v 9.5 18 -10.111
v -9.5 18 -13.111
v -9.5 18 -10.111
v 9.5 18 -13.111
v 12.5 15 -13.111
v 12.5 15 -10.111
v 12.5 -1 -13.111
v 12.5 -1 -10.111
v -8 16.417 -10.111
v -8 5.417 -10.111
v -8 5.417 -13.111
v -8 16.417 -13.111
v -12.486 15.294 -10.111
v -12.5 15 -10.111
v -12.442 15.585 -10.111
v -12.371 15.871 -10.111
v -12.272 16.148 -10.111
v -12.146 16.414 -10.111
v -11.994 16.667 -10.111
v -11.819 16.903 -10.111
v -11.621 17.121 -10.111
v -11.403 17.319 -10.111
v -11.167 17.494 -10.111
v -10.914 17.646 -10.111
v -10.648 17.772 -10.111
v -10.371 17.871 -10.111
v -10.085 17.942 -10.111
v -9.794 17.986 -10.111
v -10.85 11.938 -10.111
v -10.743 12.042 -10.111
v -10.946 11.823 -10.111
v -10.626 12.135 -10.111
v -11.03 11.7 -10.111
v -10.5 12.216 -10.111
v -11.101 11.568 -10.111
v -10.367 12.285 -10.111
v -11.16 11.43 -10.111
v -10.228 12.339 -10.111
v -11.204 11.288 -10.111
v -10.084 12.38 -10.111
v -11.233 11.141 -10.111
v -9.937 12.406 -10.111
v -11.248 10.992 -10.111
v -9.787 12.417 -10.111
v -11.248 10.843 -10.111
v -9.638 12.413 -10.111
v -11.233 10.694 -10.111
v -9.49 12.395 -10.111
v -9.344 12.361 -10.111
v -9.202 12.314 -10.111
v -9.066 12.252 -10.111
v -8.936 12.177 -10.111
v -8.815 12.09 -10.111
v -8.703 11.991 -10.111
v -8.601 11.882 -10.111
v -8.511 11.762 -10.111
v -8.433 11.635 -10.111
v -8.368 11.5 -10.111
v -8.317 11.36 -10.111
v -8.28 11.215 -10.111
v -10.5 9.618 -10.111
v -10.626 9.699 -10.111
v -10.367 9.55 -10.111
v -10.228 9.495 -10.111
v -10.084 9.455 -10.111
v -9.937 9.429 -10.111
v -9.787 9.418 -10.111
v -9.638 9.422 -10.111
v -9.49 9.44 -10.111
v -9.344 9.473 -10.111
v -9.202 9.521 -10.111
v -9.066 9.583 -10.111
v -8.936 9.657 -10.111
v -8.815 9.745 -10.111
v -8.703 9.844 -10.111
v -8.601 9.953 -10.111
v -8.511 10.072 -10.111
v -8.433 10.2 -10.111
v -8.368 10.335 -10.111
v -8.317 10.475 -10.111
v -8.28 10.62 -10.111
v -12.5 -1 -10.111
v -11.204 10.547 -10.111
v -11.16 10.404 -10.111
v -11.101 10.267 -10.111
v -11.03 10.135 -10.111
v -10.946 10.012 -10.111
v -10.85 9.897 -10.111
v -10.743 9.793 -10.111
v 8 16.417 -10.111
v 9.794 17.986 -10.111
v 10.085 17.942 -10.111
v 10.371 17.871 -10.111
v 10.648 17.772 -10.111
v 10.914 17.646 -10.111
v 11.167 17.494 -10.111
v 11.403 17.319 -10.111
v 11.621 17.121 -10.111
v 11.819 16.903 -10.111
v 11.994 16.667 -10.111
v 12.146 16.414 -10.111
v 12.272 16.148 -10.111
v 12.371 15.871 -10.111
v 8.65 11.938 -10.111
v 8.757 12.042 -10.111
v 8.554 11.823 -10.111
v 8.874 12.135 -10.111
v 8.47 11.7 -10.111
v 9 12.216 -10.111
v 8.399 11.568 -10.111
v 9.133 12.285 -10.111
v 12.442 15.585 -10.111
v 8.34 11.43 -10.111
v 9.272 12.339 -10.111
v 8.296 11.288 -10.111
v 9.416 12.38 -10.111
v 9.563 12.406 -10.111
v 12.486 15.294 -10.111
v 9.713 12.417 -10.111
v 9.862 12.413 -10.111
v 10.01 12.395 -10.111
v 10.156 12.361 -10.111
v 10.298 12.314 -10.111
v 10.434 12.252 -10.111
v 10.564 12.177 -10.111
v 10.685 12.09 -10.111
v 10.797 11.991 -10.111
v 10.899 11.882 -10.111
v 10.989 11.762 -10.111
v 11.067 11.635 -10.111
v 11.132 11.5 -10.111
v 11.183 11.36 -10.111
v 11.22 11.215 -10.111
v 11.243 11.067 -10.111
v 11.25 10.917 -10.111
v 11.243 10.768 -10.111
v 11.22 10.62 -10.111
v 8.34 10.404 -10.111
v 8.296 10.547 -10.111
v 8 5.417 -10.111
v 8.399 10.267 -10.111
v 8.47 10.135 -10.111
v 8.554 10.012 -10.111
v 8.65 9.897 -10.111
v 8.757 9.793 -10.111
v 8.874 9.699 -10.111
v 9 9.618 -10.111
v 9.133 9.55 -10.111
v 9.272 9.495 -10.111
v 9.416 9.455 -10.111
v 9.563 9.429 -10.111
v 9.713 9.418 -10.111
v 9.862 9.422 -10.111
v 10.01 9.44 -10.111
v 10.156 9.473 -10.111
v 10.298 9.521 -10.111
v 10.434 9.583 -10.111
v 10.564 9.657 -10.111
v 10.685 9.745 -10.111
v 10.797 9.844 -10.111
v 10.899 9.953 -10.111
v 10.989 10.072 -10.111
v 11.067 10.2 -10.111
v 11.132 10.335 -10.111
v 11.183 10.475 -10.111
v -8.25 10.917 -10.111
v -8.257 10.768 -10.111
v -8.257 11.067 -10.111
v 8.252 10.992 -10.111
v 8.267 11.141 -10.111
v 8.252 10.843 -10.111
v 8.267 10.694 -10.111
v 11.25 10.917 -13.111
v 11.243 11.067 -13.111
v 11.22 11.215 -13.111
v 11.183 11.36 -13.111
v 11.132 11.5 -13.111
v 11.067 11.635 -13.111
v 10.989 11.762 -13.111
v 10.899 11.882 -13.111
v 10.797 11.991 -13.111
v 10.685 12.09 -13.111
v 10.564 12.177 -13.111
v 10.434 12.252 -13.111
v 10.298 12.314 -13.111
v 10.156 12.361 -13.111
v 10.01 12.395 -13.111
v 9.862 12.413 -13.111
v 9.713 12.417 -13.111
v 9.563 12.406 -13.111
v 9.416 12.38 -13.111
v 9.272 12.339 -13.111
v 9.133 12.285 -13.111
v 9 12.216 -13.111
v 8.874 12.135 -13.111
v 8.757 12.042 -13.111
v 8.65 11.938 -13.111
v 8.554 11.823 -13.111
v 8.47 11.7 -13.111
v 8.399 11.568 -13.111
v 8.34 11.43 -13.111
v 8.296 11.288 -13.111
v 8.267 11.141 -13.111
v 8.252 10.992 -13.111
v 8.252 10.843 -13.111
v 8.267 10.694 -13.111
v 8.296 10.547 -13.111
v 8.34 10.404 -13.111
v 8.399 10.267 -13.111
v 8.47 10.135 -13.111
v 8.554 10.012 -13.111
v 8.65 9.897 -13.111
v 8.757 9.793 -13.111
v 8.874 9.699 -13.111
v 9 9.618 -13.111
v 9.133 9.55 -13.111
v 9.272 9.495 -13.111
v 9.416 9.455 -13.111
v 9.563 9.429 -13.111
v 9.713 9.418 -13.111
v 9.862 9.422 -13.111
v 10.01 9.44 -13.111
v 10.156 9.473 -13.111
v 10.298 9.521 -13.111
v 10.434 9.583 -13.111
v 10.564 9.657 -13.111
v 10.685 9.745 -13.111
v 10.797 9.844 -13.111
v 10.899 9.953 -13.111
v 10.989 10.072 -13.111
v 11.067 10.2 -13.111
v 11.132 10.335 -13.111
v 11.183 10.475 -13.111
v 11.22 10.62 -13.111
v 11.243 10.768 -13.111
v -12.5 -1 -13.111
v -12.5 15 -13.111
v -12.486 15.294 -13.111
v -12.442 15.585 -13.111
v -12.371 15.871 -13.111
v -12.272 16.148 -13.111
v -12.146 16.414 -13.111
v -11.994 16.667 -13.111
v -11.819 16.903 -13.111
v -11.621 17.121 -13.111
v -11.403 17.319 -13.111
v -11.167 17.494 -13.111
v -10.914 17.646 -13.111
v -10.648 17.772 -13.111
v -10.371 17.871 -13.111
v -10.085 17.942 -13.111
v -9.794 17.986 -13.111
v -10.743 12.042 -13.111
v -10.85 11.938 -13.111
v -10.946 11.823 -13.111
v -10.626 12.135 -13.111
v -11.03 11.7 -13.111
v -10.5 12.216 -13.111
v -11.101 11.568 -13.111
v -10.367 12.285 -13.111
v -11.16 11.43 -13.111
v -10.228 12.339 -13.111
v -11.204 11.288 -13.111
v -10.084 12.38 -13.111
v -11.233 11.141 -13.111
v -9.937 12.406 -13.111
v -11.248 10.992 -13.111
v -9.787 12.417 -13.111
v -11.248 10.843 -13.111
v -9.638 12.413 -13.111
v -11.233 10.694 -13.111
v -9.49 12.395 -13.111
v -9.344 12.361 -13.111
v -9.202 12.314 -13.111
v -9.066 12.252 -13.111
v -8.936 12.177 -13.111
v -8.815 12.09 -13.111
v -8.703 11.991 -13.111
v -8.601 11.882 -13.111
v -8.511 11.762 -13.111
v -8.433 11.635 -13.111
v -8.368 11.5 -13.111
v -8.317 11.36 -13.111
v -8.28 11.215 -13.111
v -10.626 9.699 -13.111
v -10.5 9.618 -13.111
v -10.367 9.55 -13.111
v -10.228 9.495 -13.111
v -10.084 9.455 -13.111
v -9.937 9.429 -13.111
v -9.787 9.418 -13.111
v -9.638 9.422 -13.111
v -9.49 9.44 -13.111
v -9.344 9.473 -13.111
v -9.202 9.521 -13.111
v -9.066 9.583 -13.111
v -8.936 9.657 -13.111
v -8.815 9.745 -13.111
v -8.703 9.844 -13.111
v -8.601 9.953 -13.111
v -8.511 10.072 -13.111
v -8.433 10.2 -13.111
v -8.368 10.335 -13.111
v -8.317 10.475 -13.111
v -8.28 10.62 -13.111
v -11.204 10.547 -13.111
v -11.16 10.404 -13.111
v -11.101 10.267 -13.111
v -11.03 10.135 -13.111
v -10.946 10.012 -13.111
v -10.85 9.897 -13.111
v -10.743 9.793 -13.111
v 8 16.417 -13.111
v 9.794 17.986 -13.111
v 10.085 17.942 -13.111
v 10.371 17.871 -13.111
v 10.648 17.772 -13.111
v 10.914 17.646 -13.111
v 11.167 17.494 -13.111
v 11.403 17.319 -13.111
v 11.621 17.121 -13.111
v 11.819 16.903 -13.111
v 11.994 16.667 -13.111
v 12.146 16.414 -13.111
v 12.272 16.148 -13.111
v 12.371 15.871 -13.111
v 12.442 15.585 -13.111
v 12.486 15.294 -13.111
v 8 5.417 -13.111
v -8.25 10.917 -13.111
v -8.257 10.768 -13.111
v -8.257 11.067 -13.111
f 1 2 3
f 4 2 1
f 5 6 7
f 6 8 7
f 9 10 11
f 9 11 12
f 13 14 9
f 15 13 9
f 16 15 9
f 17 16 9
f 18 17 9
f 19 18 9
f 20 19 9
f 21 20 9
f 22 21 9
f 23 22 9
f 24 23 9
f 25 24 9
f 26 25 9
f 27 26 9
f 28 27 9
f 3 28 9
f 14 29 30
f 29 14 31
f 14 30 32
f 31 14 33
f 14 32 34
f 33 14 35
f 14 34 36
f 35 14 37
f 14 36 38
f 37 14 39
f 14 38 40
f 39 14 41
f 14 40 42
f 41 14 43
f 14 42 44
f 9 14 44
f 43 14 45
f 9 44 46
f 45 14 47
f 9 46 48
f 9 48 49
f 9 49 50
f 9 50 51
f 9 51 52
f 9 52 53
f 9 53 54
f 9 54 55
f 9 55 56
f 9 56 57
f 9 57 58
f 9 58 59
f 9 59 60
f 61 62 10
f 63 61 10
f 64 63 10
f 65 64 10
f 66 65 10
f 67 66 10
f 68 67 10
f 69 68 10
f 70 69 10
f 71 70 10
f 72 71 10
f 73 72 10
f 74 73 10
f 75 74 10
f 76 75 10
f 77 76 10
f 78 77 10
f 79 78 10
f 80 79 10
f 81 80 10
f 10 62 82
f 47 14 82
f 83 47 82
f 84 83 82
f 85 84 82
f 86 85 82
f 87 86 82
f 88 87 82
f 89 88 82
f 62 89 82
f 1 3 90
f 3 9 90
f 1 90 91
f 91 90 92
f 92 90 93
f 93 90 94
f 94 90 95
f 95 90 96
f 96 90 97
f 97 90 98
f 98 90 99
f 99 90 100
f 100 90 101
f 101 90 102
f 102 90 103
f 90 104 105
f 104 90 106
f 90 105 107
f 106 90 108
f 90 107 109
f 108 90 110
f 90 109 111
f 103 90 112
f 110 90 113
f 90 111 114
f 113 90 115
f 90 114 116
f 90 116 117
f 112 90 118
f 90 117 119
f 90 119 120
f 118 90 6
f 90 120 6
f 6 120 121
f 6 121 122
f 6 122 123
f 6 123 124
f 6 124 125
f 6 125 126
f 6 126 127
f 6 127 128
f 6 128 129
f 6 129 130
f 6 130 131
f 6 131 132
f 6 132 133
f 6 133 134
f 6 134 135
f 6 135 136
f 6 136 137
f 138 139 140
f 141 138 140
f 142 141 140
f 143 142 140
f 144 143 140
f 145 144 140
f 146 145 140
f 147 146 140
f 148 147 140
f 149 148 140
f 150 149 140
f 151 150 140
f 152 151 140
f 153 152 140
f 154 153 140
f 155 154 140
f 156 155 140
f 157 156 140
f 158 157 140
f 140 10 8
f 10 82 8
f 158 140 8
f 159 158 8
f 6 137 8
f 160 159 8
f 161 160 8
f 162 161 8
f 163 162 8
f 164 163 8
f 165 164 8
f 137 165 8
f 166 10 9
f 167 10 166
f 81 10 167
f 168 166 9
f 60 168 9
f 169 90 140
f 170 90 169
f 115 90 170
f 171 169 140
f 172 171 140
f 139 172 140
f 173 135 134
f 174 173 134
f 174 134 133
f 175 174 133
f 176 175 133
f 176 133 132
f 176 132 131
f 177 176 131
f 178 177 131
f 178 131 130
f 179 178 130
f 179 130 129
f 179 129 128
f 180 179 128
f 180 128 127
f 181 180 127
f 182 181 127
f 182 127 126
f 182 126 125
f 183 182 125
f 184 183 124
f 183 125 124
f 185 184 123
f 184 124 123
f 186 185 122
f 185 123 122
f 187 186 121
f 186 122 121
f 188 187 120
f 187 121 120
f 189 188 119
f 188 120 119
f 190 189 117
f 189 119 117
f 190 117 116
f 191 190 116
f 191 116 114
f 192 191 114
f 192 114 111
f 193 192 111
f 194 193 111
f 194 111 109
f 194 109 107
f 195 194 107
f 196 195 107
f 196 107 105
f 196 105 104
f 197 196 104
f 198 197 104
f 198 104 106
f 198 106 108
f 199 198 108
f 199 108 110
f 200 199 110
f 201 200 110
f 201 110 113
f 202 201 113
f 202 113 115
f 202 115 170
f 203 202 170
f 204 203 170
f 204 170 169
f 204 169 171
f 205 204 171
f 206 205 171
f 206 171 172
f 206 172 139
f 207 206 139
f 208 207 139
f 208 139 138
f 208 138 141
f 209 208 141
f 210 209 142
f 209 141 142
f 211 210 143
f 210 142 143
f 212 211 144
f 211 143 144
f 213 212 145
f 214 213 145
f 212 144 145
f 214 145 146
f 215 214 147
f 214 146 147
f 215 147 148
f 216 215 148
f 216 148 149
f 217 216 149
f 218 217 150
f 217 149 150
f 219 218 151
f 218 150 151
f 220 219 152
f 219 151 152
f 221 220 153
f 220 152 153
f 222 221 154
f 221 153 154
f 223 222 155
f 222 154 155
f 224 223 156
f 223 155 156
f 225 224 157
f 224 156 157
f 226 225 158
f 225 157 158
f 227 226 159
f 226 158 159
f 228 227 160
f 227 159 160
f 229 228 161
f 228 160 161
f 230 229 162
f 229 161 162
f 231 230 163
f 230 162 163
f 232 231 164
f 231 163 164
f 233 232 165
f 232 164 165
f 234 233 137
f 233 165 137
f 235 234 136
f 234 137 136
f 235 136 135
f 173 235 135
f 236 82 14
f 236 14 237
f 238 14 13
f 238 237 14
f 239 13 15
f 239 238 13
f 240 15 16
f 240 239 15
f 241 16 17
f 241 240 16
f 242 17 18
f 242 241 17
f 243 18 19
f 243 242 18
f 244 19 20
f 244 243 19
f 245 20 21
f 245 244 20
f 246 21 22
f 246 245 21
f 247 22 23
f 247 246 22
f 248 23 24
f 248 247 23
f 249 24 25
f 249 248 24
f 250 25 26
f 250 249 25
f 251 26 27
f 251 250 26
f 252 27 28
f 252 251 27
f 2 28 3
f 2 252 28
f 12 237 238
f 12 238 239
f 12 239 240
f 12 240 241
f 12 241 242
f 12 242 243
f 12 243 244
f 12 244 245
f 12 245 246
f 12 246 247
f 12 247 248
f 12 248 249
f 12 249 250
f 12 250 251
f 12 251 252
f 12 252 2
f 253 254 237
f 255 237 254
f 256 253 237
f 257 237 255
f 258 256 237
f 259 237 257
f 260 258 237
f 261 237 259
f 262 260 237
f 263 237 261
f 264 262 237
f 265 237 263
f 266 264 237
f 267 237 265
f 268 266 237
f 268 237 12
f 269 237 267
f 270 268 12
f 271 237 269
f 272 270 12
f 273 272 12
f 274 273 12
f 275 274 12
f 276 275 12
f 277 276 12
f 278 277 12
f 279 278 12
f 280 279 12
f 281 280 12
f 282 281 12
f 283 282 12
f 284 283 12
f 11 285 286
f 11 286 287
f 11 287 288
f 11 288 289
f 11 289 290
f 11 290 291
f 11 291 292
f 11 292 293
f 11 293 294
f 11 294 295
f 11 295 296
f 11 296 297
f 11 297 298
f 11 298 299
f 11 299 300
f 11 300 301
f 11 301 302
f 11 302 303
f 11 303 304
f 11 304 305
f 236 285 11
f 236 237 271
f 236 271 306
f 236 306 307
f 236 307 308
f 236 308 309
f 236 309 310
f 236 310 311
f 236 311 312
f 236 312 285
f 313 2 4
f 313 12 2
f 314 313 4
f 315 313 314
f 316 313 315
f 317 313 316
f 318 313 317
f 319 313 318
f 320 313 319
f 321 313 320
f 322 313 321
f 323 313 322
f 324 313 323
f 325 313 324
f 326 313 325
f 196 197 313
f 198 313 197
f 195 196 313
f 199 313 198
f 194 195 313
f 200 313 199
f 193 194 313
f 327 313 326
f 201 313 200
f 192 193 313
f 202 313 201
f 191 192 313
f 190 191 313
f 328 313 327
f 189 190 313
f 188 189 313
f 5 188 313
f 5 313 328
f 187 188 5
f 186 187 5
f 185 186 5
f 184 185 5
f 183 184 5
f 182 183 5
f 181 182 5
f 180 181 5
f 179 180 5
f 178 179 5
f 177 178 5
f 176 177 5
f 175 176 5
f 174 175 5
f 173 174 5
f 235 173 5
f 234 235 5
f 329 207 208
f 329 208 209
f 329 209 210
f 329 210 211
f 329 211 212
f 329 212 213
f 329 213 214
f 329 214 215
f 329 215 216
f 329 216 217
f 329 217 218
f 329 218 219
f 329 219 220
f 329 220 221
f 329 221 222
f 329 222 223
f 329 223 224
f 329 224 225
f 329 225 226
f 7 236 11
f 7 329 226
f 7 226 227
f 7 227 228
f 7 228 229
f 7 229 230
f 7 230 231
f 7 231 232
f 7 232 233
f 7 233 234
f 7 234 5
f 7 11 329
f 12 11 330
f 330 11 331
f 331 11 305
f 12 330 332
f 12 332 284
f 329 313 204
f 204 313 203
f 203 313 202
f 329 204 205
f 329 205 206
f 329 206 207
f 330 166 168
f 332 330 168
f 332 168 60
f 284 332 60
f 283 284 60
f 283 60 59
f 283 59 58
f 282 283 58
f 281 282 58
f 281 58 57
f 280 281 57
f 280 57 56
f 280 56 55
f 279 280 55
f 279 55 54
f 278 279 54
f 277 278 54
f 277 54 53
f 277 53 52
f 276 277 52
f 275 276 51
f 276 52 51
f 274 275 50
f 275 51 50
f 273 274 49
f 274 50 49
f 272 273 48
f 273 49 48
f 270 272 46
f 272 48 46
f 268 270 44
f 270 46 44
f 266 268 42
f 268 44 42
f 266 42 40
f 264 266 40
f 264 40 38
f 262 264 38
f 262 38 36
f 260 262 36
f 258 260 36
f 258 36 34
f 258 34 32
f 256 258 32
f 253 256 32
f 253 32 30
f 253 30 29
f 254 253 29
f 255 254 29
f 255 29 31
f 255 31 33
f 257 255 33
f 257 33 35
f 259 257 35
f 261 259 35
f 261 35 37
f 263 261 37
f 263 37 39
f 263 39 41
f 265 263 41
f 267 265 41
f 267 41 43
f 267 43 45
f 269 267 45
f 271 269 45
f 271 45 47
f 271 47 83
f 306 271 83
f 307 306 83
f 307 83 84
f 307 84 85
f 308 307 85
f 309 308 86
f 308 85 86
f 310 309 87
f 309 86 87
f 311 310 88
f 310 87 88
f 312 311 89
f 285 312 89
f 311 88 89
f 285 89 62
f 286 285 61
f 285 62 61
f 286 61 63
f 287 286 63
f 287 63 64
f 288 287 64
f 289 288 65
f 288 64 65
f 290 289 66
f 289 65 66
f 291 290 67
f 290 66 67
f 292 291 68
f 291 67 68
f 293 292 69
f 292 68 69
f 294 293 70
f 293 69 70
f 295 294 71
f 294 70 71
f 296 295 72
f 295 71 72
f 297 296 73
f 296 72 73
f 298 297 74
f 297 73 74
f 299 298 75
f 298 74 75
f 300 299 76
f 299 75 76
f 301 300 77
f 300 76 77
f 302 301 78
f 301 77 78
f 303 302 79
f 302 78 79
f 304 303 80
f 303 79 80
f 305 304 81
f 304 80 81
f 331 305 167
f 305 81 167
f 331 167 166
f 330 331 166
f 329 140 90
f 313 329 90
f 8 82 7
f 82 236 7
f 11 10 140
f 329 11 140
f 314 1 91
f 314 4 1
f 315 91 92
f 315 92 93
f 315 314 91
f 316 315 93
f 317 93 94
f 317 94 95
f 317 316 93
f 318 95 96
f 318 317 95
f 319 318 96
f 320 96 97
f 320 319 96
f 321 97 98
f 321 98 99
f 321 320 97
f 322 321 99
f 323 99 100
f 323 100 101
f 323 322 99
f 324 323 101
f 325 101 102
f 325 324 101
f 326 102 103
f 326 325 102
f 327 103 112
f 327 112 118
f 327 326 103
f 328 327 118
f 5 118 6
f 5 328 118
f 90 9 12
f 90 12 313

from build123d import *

# Parameters (mm, degrees)
BOSS_EXTRUDE1_DEPTH     = 2
SCALE1_SCALE            = 2
SKETCH6_R               = 1.5
CUT_EXTRUDE2_DEPTH      = 3
SKETCH7_W               = 25
SKETCH7_H               = 3
BOSS_EXTRUDE2_DEPTH     = 15
SKETCH8_R               = 1.5
SKETCH8_W               = 16
SKETCH8_H               = 11
CUT_EXTRUDE3_DEPTH      = 18
FILLET3_R               = 3
FILLET4_R               = 3
SKETCH10_R              = 1.5
CUT_EXTRUDE4_DEPTH      = 10
CUT_EXTRUDE5_DEPTH      = 52.533558907
CUT_EXTRUDE5_DEPTH_BACK = 52.533558907
SKETCH11_R              = 44.440054466
SKETCH11_W              = 25
SKETCH11_H              = 3


with BuildPart() as part:
    # Sketch2 → Boss-Extrude1 (new body)
    with BuildSketch(Plane(origin=(0, 0, 0), x_dir=(1, 0, 0), z_dir=(0, 1, 0))):
        with BuildLine():
            Line((-17.967387551, 9.159795774), (-20.639475337, 7.15016677))
            ThreePointArc((-20.639475337, 7.15016677), (-18.649238809, 4.17439457), (-19.346117765, 0.662896123))
            ThreePointArc((-19.346117765, 0.662896123), (-19.45411943, -1.286546543), (-18.558961711, -3.021678736))
            ThreePointArc((-18.558961711, -3.021678736), (-16.421478173, -5.190969631), (-13.78312899, -6.712078584))
            ThreePointArc((-13.78312899, -6.712078584), (-13.032173848, -6.916004841), (-12.276686285, -7.102440046))
            ThreePointArc((-12.276686285, -7.102440046), (-12.194265553, -8.245293076), (-11.737308023, -9.296052821))
            ThreePointArc((-11.737308023, -9.296052821), (-10.975506649, -9.937799505), (-10.090124565, -10.394175126))
            Line((-10.090124565, -10.394175126), (-7.391598262, -11.698651137))
            Line((-7.391598262, -11.698651137), (7.391598262, -11.698651137))
            Line((7.391598262, -11.698651137), (10.090124565, -10.394175126))
            ThreePointArc((10.090124565, -10.394175126), (10.975506649, -9.937799505), (11.737308023, -9.296052821))
            ThreePointArc((11.737308023, -9.296052821), (12.194265553, -8.245293076), (12.276686285, -7.102440046))
            ThreePointArc((12.276686285, -7.102440046), (13.032173848, -6.916004841), (13.78312899, -6.712078584))
            ThreePointArc((13.78312899, -6.712078584), (16.421478173, -5.190969631), (18.558961711, -3.021678736))
            ThreePointArc((18.558961711, -3.021678736), (19.45411943, -1.286546543), (19.346117765, 0.662896123))
            ThreePointArc((19.346117765, 0.662896123), (18.649238809, 4.17439457), (20.639475337, 7.15016677))
            Line((20.639475337, 7.15016677), (17.967387551, 9.159795774))
            ThreePointArc((17.967387551, 9.159795774), (10.858325227, 7.499674132), (4.169484372, 10.424426945))
            Line((4.169484372, 10.424426945), (2.224138848, 10.424426945))
            Line((2.224138848, 10.424426945), (0.696104526, 13.114793475))
            Line((0.696104526, 13.114793475), (0, 13.358013588))
            Line((0, 13.358013588), (-0.696104526, 13.114793475))
            Line((-0.696104526, 13.114793475), (-2.224138848, 10.424426945))
            Line((-2.224138848, 10.424426945), (-4.169484372, 10.424426945))
            ThreePointArc((-4.169484372, 10.424426945), (-10.858325227, 7.499674132), (-17.967387551, 9.159795774))
        make_face()
    extrude(amount=BOSS_EXTRUDE1_DEPTH)


with BuildPart() as part_1:
    # Scale1: scaled about (0, 1, 0.242383844)
    add(part.part.scale(SCALE1_SCALE).moved(Location((0, -1, -0.242383844))))

    # Sketch6 → Cut-Extrude2 (cut)
    with BuildSketch(Plane(origin=(0, 3, 0), x_dir=(1, 0, 0), z_dir=(0, 1, 0))):
        with Locations(Location((-5.851533015, 16.28357055, 0), (0, 0, 270))):
            Circle(SKETCH6_R)
        with Locations(Location((4.151829214, 16.28357055, 0), (0, 0, 270))):
            Circle(SKETCH6_R)
    extrude(amount=-CUT_EXTRUDE2_DEPTH, mode=Mode.SUBTRACT)

    # Sketch7 → Boss-Extrude2 (add)
    with BuildSketch(Plane(origin=(0, 3, 0), x_dir=(1, 0, 0), z_dir=(0, 1, 0))):
        with Locations((0, 11.610861671)):
            Rectangle(SKETCH7_W, SKETCH7_H)
    extrude(amount=BOSS_EXTRUDE2_DEPTH)

    # Sketch8 → Cut-Extrude3 (cut)
    with BuildSketch(Plane.XY.offset(-10.110861671)):
        with Locations((-9.75, 10.917386914)):
            Circle(SKETCH8_R)
        with Locations((9.75, 10.917386914)):
            Circle(SKETCH8_R)
        with Locations((0, 10.917386914)):
            Rectangle(SKETCH8_W, SKETCH8_H)
    extrude(amount=-CUT_EXTRUDE3_DEPTH, mode=Mode.SUBTRACT)

    # Fillet3
    fillet3_edges = [part_1.edges().sort_by_distance(p)[0] for p in [
        (-12.5, 18, -11.610861671),
    ]]
    fillet(fillet3_edges, radius=FILLET3_R)

    # Fillet4
    fillet4_edges = [part_1.edges().sort_by_distance(p)[0] for p in [
        (12.5, 18, -11.610861671),
    ]]
    fillet(fillet4_edges, radius=FILLET4_R)

    # Sketch10 → Cut-Extrude4 (cut)
    with BuildSketch(Plane(origin=(0, 3, 0), x_dir=(1, 0, 0), z_dir=(0, 1, 0))):
        with Locations(Location((-0.8498519, -20.895328087, 0), (0, 0, 270))):
            Circle(SKETCH10_R)
    extrude(amount=-CUT_EXTRUDE4_DEPTH, mode=Mode.SUBTRACT)

    # Sketch11 → Cut-Extrude5 (cut, two sides: drawn at the far end of the back side and taken through both)
    with BuildSketch(Plane(origin=(0, 3, 0), x_dir=(1, 0, 0), z_dir=(0, 1, 0)).offset(-CUT_EXTRUDE5_DEPTH_BACK)):
        Circle(SKETCH11_R)
        with Locations((0, 11.610861671)):
            Rectangle(SKETCH11_W, SKETCH11_H, mode=Mode.SUBTRACT)
    extrude(amount=CUT_EXTRUDE5_DEPTH + CUT_EXTRUDE5_DEPTH_BACK, mode=Mode.SUBTRACT)


solid = part_1.part
